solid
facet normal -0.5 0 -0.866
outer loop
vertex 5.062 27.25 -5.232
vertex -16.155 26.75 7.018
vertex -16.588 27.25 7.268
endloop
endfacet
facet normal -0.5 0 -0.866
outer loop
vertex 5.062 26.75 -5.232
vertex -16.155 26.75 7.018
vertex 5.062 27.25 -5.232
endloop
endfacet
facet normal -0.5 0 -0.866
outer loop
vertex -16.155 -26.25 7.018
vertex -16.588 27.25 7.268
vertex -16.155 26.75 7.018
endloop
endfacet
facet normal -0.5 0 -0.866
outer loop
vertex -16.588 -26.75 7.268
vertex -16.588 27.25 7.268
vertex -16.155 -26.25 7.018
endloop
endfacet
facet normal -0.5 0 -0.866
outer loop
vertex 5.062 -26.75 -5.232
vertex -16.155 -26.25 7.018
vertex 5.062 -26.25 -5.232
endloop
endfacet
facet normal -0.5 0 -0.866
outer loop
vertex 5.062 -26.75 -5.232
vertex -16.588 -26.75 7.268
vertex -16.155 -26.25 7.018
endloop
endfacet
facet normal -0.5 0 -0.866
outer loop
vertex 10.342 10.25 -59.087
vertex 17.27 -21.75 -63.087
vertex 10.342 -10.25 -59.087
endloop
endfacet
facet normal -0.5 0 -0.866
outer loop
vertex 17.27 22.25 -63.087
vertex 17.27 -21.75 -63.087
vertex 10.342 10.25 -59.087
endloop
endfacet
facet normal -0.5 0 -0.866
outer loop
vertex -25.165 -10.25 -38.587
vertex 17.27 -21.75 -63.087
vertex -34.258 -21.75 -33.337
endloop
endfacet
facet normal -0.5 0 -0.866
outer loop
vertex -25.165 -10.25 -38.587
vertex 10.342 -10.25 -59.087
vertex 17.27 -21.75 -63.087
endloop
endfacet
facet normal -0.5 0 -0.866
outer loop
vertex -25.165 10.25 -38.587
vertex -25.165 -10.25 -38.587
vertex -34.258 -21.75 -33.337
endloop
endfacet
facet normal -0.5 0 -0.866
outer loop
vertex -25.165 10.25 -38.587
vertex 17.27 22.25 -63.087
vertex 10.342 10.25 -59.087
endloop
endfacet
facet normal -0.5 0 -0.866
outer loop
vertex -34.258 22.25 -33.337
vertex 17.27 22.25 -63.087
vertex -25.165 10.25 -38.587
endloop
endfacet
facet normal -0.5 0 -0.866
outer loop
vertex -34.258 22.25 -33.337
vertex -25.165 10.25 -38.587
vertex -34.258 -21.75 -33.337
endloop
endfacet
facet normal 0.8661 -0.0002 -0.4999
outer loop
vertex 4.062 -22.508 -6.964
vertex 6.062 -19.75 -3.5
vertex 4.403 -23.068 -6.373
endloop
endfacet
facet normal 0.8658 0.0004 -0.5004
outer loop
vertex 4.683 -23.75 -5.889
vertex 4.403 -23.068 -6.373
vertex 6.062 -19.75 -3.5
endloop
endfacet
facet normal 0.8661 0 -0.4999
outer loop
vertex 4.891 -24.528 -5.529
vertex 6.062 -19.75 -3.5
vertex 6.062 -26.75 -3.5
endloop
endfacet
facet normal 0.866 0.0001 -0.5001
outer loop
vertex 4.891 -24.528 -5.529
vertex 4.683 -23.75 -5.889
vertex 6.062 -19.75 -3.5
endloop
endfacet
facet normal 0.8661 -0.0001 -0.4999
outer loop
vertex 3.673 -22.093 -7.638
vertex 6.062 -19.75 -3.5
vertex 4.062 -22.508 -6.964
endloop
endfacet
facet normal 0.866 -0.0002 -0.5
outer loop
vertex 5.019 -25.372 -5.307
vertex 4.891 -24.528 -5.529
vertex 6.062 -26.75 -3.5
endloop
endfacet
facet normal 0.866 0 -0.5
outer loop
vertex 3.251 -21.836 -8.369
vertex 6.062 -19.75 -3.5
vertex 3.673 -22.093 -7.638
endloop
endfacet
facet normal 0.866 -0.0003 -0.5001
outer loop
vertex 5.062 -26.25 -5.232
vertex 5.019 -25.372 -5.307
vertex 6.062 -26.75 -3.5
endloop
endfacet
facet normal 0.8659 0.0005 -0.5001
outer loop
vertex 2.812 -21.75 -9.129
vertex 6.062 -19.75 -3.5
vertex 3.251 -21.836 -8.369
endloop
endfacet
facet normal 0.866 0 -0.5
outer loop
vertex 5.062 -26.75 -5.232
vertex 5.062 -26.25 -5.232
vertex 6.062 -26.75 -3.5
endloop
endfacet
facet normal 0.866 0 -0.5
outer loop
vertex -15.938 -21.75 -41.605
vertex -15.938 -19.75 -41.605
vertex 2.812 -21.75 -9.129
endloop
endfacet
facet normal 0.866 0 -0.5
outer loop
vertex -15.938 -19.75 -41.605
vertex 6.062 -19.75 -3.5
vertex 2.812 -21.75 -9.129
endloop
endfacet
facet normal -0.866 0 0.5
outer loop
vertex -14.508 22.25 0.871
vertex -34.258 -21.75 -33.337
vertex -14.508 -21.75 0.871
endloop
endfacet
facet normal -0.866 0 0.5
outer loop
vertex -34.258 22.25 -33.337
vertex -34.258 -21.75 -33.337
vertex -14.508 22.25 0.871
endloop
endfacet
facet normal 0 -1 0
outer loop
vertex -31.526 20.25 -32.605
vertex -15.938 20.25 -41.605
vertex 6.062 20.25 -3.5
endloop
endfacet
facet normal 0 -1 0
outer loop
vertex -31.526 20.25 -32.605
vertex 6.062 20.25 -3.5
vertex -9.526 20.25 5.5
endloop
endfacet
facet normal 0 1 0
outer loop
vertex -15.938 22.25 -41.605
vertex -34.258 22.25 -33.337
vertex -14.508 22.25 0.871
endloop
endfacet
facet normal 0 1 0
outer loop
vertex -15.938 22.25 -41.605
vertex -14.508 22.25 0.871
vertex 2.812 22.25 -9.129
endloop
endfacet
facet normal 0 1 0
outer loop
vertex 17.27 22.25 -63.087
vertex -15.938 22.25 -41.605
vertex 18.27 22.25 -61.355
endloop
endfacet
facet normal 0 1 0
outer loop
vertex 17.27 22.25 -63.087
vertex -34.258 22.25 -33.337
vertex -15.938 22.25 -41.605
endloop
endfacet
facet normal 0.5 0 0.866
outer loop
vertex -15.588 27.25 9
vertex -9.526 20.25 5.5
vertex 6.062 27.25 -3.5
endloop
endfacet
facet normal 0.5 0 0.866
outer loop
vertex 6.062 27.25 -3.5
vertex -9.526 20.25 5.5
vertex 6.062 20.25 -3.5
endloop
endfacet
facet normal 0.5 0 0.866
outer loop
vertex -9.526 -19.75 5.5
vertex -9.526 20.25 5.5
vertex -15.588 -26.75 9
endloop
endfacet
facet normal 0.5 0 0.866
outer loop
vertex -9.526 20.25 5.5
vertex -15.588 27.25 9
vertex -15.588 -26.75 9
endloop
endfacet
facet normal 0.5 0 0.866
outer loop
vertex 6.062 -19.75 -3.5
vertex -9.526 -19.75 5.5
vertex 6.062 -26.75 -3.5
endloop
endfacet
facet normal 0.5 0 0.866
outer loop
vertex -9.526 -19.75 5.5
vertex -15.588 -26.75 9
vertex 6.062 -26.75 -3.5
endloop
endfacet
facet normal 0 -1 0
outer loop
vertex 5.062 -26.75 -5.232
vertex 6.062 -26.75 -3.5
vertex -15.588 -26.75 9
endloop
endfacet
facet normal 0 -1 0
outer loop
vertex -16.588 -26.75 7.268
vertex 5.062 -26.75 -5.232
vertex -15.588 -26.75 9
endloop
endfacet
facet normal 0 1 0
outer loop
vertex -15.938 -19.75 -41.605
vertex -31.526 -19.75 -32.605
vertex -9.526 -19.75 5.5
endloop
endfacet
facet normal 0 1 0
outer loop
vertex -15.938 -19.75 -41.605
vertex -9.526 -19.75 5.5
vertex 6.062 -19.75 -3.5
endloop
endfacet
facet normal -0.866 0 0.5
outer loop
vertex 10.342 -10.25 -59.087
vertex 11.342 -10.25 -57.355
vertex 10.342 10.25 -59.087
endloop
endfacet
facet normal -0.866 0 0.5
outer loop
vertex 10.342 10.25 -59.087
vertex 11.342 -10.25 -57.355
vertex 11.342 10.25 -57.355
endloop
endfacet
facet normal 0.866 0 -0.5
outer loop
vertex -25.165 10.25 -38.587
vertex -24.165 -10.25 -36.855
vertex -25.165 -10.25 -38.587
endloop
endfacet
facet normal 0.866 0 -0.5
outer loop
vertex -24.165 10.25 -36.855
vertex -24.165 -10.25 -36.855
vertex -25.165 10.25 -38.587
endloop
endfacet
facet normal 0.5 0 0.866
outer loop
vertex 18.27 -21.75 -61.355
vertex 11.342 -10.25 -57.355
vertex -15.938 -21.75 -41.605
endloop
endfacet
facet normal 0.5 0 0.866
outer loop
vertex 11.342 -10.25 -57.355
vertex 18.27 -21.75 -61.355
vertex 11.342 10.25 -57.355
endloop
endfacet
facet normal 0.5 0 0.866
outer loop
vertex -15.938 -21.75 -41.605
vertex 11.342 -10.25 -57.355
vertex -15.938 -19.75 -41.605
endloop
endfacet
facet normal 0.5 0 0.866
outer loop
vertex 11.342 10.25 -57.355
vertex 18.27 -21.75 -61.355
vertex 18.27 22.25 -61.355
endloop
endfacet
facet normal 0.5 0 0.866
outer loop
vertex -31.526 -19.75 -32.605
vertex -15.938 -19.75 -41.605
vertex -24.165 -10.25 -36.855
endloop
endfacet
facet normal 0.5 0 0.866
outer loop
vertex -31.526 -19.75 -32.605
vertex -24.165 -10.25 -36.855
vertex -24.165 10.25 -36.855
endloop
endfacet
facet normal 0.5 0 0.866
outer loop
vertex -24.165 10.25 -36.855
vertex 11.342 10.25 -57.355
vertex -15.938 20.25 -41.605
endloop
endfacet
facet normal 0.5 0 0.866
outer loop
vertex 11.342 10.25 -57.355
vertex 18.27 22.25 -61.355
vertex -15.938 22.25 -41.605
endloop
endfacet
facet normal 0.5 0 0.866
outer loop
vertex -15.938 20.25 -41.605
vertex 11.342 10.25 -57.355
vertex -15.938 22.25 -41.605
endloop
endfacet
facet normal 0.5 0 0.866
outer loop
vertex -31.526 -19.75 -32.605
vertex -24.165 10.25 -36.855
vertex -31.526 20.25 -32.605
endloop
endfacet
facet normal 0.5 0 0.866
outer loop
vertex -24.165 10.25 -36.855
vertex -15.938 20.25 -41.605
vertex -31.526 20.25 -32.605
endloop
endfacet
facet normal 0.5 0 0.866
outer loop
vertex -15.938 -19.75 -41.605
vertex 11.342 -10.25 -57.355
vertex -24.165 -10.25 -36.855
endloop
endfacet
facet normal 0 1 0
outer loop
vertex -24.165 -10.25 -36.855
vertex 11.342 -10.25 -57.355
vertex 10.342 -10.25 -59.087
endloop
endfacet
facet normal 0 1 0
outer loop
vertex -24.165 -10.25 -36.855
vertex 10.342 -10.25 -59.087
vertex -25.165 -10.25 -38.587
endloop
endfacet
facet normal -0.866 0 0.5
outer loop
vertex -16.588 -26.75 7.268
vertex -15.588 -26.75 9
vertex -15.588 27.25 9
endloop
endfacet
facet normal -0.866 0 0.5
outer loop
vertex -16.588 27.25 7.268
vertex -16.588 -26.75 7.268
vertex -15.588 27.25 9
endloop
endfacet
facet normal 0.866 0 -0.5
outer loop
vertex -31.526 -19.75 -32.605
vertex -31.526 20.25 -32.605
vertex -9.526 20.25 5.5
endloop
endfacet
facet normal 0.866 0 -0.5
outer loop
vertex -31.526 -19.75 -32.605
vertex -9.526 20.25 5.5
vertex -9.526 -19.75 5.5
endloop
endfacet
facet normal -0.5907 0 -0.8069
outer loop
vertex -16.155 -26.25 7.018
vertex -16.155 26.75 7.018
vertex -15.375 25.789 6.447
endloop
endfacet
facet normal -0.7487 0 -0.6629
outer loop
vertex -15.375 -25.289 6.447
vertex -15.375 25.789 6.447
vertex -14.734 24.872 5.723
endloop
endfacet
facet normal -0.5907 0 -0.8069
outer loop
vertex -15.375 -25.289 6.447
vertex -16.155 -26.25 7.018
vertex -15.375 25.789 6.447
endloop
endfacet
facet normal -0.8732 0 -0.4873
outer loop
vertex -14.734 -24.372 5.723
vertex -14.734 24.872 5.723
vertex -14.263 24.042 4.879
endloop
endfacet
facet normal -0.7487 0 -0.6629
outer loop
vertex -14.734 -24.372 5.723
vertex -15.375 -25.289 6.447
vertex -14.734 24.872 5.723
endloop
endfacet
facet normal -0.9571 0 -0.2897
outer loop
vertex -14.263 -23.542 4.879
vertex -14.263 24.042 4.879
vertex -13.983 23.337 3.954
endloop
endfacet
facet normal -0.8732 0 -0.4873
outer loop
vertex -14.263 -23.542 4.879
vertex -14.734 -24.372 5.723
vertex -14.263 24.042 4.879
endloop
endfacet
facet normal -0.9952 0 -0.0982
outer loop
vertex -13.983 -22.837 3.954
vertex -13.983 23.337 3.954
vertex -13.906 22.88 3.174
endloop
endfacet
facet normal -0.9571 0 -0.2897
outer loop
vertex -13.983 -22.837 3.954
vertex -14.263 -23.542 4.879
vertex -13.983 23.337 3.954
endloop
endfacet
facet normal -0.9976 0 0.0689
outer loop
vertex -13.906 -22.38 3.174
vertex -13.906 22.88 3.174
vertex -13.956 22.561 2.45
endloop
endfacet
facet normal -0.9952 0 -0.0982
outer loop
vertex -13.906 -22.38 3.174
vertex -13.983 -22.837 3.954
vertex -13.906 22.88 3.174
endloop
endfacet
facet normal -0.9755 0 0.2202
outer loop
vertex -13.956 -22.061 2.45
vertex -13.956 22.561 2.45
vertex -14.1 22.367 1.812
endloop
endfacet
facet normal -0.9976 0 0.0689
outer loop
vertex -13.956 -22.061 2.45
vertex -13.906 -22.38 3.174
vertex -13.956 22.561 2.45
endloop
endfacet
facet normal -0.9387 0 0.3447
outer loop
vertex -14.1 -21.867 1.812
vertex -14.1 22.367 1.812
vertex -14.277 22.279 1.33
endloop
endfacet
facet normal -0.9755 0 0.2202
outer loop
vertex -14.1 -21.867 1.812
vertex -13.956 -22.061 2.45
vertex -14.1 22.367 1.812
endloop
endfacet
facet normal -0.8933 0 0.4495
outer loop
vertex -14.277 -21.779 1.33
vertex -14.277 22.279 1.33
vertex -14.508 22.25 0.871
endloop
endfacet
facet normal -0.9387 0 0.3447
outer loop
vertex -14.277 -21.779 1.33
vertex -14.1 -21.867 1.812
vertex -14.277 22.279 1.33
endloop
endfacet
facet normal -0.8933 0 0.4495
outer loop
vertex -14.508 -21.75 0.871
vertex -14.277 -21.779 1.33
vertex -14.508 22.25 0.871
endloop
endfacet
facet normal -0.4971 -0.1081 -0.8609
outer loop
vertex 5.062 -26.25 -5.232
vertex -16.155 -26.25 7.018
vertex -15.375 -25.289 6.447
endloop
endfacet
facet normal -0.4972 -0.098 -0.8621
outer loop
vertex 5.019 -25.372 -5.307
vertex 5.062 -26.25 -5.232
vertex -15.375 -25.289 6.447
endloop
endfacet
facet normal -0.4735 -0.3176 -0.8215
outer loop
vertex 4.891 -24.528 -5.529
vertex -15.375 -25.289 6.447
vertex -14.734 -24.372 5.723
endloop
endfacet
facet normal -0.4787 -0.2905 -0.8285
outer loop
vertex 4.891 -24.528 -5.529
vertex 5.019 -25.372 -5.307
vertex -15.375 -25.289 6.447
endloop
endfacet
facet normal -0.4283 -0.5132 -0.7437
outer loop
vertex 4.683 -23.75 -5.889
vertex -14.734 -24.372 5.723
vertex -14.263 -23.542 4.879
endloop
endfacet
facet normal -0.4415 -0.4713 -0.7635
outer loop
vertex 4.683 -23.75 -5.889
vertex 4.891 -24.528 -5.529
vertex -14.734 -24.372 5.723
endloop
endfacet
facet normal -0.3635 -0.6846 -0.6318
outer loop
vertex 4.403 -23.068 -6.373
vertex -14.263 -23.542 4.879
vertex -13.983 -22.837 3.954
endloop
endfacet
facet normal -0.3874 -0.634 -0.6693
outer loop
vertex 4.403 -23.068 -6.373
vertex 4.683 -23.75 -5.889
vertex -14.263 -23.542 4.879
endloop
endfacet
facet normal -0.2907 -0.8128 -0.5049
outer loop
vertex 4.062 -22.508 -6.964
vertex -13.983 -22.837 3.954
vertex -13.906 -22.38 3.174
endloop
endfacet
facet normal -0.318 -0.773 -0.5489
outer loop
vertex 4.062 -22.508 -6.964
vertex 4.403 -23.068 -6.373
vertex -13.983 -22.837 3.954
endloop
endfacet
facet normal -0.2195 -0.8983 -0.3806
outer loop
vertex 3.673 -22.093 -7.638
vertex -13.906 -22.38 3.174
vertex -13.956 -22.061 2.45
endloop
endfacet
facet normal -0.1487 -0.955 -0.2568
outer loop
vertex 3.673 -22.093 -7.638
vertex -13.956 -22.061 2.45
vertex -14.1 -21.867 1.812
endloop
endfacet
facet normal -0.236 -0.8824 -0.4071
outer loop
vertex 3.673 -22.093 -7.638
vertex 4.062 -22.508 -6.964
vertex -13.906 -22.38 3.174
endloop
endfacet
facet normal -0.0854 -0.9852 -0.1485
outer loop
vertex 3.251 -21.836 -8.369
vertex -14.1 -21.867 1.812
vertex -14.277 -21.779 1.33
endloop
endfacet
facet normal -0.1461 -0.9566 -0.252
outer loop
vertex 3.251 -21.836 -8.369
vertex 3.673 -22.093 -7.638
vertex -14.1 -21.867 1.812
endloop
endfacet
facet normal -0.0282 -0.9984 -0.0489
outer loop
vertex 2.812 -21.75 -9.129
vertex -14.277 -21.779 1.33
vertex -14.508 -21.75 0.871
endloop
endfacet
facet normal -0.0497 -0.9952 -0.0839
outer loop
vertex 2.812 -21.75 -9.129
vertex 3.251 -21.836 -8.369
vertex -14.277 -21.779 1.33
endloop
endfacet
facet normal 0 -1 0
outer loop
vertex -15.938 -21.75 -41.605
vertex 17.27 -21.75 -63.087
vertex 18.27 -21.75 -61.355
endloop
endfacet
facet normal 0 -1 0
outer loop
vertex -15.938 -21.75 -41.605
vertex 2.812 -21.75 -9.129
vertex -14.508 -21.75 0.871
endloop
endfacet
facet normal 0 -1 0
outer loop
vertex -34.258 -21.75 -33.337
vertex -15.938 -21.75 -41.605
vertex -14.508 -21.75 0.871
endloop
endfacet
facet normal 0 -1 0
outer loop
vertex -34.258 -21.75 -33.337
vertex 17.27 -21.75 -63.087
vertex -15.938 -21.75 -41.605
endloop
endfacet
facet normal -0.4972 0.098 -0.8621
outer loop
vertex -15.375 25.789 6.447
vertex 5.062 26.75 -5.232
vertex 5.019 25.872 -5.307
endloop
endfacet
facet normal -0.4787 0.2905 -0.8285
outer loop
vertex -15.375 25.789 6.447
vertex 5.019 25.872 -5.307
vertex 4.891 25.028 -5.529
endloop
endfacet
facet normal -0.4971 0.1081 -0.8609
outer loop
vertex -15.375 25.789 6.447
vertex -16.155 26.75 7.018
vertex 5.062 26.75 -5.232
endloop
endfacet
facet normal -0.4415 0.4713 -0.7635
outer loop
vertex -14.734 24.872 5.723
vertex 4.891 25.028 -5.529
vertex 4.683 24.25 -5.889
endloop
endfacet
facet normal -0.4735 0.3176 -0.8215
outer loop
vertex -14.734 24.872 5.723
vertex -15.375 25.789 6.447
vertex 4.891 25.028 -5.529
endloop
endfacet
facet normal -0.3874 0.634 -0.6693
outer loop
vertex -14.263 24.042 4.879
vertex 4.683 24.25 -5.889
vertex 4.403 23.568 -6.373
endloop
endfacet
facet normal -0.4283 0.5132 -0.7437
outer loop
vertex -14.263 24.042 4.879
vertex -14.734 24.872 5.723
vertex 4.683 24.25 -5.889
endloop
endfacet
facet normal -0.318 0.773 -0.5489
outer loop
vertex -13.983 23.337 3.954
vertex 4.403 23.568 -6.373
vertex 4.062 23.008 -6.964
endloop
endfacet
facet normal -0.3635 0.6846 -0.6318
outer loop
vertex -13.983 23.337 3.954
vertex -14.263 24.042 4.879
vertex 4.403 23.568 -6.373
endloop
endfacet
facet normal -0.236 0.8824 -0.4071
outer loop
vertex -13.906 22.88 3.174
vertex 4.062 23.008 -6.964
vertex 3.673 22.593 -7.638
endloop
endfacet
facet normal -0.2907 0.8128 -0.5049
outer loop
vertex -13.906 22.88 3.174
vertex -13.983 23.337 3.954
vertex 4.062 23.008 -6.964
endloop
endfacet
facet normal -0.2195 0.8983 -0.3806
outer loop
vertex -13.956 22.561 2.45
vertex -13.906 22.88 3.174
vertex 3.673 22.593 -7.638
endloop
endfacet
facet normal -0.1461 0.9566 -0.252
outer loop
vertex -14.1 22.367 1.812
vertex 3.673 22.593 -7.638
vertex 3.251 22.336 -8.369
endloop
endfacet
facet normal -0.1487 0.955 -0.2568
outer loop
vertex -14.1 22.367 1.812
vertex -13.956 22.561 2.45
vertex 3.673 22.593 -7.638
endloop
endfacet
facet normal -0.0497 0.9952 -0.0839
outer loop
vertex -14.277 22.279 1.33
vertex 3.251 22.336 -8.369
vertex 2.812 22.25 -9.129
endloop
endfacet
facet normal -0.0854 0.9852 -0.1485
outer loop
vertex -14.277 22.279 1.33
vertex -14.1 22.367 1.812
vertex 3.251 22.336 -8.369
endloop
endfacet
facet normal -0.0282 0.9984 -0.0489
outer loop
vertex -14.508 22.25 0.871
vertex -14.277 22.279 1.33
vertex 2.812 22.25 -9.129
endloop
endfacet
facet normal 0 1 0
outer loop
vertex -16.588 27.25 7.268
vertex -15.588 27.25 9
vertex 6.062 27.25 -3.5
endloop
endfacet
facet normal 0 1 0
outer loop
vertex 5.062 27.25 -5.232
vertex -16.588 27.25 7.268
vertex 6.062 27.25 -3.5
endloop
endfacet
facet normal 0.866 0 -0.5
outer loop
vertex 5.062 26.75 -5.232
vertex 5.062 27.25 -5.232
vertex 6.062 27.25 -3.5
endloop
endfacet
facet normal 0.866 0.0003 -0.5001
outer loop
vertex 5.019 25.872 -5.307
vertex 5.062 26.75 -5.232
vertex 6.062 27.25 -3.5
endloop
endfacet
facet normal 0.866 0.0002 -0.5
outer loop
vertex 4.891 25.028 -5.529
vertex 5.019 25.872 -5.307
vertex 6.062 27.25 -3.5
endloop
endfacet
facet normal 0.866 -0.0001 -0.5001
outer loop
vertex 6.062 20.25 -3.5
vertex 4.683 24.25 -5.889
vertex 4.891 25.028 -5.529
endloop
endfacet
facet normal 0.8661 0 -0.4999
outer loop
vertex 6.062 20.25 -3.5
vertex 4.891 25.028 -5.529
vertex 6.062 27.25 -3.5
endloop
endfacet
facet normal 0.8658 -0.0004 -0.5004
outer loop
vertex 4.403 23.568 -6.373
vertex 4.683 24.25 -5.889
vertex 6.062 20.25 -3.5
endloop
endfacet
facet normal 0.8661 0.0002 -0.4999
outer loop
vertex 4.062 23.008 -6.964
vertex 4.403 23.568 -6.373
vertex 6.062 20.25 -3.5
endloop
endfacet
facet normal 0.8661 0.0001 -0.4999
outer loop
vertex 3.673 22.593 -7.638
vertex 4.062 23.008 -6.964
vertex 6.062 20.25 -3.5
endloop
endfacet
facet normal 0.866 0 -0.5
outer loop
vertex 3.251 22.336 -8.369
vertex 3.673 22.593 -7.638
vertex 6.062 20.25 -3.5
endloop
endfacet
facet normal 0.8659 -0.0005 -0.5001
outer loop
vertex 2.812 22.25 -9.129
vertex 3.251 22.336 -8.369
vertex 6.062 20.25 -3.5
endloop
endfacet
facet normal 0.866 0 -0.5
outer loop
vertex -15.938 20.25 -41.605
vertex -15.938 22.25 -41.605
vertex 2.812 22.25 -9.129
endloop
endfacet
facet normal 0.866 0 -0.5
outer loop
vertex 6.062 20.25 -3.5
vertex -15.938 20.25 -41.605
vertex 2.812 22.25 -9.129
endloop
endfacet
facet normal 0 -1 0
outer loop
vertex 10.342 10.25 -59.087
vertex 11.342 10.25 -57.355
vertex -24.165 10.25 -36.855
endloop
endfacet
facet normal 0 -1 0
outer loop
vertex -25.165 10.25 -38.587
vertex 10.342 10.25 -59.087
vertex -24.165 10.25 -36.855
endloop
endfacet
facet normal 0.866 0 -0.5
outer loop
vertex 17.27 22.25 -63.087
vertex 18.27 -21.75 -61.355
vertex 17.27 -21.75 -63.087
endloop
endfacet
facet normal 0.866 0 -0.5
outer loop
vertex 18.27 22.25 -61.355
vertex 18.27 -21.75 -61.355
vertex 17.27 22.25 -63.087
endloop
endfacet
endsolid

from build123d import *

# Parameters (mm, degrees)
SKETCH029_W             = 59.5
SKETCH029_H             = 44
SKETCH029_W_2           = 41
SKETCH029_H_2           = 20.5
PAD015_DEPTH            = 2
PAD016_DEPTH            = 44
PAD017_DEPTH            = 2
FILLET_R                = 4.5
BODY011_PLACEMENT_ANGLE = 210


with BuildPart() as part:
    # Sketch029 → Pad015 (new body)
    with BuildSketch(Plane.XY):
        with Locations((1.25, 0.25)):
            Rectangle(SKETCH029_W, SKETCH029_H)
        Rectangle(SKETCH029_W_2, SKETCH029_H_2, mode=Mode.SUBTRACT)
    extrude(amount=PAD015_DEPTH)

    # Sketch030 (on Face9 of Pad015) → Pad016 (join)
    with BuildSketch(Plane(origin=(0, 0, 0), x_dir=(1, 0, 0), z_dir=(0, 0, -1))):
        Polygon((31, 21.75), (31, -22.25), (11, -22.25), (11, -20.25), (29, -20.25), (29, 19.75), (11, 19.75), (11, 21.75), align=None)
    extrude(amount=PAD016_DEPTH)

    # Sketch031 (on Face18 of Pad016) → Pad017 (join)
    with BuildSketch(Plane(origin=(0, 0, -44), x_dir=(1, 0, 0), z_dir=(0, 0, -1))):
        Polygon((11, 19.75), (11, 26.75), (36, 26.75), (36, -27.25), (11, -27.25), (11, -20.25), (29, -20.25), (29, 19.75), align=None)
    extrude(amount=-PAD017_DEPTH)

    # Fillet
    fillet_edges = [part.edges().sort_by_distance(p)[0] for p in [
        (31, 0.25, -42),
        (21, 22.25, -42),
        (21, -21.75, -42),
    ]]
    fillet(fillet_edges, radius=FILLET_R)


with BuildPart() as part_1:
    # Body011 placement: moved
    add(part.part.moved(Location((-6.411543, 0, -47.105118))).rotate(Axis((-6.411543, 0, -47.105118), (0, 1, 0)), BODY011_PLACEMENT_ANGLE))


solid = part_1.part
